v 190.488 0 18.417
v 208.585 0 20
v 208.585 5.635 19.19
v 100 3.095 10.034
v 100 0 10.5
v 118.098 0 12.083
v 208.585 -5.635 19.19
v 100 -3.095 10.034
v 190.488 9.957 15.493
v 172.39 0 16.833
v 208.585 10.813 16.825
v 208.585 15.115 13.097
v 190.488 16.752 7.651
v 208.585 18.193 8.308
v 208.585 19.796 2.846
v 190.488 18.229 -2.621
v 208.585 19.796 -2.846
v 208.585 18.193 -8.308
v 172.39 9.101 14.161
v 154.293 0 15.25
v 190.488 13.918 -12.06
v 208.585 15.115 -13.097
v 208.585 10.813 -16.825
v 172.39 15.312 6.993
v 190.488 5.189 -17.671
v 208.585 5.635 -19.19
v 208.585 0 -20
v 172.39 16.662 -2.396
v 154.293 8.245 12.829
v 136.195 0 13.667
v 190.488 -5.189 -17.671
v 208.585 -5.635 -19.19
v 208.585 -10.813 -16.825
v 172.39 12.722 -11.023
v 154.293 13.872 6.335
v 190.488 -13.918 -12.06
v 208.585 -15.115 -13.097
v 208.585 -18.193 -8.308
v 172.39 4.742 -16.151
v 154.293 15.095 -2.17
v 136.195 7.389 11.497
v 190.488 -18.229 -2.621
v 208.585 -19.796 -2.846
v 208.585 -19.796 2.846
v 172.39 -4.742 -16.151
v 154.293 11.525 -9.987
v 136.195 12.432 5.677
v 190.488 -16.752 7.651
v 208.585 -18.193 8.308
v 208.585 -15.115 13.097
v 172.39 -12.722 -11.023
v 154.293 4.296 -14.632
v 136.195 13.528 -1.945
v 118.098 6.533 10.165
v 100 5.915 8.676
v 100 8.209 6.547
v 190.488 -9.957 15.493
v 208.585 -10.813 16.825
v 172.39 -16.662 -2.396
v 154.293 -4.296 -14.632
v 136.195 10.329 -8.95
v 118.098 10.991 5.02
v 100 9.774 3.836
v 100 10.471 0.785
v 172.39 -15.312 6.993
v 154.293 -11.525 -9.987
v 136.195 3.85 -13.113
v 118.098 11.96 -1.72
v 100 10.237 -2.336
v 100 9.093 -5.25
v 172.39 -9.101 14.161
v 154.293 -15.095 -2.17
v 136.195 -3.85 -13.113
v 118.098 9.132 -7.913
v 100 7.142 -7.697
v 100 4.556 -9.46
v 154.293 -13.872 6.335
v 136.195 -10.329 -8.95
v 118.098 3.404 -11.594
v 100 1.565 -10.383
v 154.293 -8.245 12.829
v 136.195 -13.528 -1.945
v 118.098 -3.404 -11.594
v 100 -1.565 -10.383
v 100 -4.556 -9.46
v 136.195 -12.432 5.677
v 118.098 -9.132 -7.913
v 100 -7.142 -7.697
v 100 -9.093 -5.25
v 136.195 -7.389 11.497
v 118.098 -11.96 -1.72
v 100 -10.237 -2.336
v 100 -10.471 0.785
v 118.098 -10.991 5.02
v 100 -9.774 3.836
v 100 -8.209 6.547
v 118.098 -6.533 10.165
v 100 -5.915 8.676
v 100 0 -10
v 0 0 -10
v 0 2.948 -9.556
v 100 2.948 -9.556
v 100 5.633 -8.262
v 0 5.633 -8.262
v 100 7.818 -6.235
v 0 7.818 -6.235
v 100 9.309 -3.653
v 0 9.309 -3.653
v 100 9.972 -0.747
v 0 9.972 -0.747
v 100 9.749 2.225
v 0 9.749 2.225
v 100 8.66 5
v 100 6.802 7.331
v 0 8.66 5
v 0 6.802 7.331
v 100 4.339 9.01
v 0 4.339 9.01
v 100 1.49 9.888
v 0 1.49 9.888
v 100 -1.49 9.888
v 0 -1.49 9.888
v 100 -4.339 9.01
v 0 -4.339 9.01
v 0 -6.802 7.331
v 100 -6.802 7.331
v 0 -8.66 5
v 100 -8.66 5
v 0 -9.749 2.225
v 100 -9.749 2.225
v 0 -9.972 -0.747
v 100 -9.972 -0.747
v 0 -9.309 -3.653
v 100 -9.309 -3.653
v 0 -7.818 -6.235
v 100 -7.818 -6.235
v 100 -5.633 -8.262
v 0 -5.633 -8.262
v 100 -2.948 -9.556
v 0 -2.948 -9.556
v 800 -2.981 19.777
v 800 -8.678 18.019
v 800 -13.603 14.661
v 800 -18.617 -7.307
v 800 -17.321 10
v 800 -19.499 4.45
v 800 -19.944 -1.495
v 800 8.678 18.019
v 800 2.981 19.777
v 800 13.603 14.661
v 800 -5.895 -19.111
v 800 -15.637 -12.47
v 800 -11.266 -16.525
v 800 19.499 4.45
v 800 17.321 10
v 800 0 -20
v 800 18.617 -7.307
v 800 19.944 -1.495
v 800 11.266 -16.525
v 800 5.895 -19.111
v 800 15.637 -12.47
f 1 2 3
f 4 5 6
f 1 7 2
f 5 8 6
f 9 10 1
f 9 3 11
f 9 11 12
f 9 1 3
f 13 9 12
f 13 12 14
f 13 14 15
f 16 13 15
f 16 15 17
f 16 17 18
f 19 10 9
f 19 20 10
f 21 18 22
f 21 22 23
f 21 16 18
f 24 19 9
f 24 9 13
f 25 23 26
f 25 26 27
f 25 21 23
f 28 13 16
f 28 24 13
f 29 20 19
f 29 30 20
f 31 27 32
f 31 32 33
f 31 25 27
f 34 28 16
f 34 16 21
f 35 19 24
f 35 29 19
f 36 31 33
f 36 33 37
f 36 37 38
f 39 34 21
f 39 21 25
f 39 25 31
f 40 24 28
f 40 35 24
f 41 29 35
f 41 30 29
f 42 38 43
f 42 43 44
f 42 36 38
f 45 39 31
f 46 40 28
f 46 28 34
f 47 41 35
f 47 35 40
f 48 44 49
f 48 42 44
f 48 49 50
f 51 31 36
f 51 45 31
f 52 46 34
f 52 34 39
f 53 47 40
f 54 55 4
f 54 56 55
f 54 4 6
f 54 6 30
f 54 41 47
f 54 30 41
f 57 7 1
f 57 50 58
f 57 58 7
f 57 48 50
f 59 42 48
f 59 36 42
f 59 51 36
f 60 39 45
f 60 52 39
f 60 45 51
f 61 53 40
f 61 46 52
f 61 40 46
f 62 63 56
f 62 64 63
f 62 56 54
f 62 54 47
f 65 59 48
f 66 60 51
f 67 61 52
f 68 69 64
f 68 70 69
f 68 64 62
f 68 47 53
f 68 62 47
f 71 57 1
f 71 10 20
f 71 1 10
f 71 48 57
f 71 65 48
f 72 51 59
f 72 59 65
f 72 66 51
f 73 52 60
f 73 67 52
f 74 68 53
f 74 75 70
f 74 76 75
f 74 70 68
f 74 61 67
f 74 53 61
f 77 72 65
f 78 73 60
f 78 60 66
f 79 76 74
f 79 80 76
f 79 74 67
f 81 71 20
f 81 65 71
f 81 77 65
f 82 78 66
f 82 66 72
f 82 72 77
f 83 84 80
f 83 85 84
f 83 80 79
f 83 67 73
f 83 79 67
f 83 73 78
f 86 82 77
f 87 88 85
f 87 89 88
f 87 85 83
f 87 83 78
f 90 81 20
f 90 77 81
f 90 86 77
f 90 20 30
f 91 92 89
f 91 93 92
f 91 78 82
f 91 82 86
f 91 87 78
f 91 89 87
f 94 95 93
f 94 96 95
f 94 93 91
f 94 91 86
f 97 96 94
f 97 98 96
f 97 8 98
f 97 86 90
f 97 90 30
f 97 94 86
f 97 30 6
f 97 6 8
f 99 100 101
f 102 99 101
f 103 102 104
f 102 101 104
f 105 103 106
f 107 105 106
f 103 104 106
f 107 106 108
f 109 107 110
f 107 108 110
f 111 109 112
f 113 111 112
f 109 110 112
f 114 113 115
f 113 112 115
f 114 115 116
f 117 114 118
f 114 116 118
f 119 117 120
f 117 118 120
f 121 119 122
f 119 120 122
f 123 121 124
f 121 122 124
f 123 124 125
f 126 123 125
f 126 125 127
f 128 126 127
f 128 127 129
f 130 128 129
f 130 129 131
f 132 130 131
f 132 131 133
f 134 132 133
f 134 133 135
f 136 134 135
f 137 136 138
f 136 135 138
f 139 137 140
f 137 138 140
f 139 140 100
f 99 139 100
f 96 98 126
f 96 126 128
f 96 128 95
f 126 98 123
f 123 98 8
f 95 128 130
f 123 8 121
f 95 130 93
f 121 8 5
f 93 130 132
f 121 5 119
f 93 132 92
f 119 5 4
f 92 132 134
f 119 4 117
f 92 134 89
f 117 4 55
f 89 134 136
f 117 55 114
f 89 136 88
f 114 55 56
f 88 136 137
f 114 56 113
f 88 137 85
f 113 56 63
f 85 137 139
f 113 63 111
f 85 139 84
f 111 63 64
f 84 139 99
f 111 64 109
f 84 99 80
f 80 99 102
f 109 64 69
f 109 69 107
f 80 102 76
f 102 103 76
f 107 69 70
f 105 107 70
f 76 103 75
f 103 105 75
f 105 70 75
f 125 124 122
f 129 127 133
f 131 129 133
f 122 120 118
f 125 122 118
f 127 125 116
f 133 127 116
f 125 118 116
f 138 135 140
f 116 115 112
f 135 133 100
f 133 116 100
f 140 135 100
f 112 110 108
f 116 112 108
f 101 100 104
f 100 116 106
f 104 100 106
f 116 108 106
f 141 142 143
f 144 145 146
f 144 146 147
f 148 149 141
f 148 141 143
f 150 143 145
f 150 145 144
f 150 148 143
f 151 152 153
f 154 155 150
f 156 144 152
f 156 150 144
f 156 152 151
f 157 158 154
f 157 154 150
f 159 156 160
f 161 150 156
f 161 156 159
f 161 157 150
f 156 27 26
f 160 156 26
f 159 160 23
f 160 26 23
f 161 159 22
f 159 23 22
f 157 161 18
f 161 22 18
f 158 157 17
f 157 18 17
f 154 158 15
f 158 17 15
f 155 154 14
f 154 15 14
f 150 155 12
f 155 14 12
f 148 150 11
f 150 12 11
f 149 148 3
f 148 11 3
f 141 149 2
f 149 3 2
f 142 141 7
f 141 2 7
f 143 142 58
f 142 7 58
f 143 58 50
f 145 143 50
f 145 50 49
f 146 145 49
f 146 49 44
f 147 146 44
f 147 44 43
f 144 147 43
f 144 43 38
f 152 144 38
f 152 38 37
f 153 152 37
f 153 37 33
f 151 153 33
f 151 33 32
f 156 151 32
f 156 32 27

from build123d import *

# Parameters (mm, degrees)
SKETCH1_R           = 10
BOSS_EXTRUDE1_DEPTH = 100
SKETCH2_R           = 20
BOSS_EXTRUDE3_DEPTH = 700
SKETCH4_OUTSIDE_W   = 324.884
SKETCH4_OUTSIDE_H   = 324.884
SKETCH4_OUTSIDE_R   = 10.5
CUT_EXTRUDE2_DEPTH  = 700
CUT_EXTRUDE2_DRAFT  = -5


with BuildPart() as part:
    # Sketch1 → Boss-Extrude1 (new body)
    with BuildSketch(Plane(origin=(0, 0, 0), x_dir=(0, 0, -1), z_dir=(1, 0, 0))):
        Circle(SKETCH1_R)
    extrude(amount=BOSS_EXTRUDE1_DEPTH)

    # Sketch2 → Boss-Extrude3 (add)
    with BuildSketch(Plane(origin=(100, 0, 0), x_dir=(0, 0, -1), z_dir=(1, 0, 0))):
        Circle(SKETCH2_R)
    extrude(amount=BOSS_EXTRUDE3_DEPTH)


with BuildPart() as cut_extrude2_tool:
    # Sketch4 outside → Cut-Extrude2 (with draft: the straight prism first)
    with BuildSketch(Plane.ZY.offset(-100)):
        Rectangle(SKETCH4_OUTSIDE_W, SKETCH4_OUTSIDE_H)
        Circle(SKETCH4_OUTSIDE_R, mode=Mode.SUBTRACT)
    extrude(amount=-CUT_EXTRUDE2_DEPTH)
    # Cut-Extrude2: the draft: its side faces are tilted about the plane it starts from
    cut_extrude2_sides = [cut_extrude2_tool.faces().sort_by_distance(p)[0] for p in [
        (450, -162.442, 0),
        (450, 0, 162.442),
        (450, 162.442, 0),
        (450, 0, -162.442),
        (450, 0, -10.5),
    ]]
    draft(cut_extrude2_sides, Plane.ZY.offset(-100), CUT_EXTRUDE2_DRAFT)


with BuildPart() as part_1:
    add(part.part)

    # Cut-Extrude2: cut by cut_extrude2_tool
    add(cut_extrude2_tool.part, mode=Mode.SUBTRACT)


solid = part_1.part
